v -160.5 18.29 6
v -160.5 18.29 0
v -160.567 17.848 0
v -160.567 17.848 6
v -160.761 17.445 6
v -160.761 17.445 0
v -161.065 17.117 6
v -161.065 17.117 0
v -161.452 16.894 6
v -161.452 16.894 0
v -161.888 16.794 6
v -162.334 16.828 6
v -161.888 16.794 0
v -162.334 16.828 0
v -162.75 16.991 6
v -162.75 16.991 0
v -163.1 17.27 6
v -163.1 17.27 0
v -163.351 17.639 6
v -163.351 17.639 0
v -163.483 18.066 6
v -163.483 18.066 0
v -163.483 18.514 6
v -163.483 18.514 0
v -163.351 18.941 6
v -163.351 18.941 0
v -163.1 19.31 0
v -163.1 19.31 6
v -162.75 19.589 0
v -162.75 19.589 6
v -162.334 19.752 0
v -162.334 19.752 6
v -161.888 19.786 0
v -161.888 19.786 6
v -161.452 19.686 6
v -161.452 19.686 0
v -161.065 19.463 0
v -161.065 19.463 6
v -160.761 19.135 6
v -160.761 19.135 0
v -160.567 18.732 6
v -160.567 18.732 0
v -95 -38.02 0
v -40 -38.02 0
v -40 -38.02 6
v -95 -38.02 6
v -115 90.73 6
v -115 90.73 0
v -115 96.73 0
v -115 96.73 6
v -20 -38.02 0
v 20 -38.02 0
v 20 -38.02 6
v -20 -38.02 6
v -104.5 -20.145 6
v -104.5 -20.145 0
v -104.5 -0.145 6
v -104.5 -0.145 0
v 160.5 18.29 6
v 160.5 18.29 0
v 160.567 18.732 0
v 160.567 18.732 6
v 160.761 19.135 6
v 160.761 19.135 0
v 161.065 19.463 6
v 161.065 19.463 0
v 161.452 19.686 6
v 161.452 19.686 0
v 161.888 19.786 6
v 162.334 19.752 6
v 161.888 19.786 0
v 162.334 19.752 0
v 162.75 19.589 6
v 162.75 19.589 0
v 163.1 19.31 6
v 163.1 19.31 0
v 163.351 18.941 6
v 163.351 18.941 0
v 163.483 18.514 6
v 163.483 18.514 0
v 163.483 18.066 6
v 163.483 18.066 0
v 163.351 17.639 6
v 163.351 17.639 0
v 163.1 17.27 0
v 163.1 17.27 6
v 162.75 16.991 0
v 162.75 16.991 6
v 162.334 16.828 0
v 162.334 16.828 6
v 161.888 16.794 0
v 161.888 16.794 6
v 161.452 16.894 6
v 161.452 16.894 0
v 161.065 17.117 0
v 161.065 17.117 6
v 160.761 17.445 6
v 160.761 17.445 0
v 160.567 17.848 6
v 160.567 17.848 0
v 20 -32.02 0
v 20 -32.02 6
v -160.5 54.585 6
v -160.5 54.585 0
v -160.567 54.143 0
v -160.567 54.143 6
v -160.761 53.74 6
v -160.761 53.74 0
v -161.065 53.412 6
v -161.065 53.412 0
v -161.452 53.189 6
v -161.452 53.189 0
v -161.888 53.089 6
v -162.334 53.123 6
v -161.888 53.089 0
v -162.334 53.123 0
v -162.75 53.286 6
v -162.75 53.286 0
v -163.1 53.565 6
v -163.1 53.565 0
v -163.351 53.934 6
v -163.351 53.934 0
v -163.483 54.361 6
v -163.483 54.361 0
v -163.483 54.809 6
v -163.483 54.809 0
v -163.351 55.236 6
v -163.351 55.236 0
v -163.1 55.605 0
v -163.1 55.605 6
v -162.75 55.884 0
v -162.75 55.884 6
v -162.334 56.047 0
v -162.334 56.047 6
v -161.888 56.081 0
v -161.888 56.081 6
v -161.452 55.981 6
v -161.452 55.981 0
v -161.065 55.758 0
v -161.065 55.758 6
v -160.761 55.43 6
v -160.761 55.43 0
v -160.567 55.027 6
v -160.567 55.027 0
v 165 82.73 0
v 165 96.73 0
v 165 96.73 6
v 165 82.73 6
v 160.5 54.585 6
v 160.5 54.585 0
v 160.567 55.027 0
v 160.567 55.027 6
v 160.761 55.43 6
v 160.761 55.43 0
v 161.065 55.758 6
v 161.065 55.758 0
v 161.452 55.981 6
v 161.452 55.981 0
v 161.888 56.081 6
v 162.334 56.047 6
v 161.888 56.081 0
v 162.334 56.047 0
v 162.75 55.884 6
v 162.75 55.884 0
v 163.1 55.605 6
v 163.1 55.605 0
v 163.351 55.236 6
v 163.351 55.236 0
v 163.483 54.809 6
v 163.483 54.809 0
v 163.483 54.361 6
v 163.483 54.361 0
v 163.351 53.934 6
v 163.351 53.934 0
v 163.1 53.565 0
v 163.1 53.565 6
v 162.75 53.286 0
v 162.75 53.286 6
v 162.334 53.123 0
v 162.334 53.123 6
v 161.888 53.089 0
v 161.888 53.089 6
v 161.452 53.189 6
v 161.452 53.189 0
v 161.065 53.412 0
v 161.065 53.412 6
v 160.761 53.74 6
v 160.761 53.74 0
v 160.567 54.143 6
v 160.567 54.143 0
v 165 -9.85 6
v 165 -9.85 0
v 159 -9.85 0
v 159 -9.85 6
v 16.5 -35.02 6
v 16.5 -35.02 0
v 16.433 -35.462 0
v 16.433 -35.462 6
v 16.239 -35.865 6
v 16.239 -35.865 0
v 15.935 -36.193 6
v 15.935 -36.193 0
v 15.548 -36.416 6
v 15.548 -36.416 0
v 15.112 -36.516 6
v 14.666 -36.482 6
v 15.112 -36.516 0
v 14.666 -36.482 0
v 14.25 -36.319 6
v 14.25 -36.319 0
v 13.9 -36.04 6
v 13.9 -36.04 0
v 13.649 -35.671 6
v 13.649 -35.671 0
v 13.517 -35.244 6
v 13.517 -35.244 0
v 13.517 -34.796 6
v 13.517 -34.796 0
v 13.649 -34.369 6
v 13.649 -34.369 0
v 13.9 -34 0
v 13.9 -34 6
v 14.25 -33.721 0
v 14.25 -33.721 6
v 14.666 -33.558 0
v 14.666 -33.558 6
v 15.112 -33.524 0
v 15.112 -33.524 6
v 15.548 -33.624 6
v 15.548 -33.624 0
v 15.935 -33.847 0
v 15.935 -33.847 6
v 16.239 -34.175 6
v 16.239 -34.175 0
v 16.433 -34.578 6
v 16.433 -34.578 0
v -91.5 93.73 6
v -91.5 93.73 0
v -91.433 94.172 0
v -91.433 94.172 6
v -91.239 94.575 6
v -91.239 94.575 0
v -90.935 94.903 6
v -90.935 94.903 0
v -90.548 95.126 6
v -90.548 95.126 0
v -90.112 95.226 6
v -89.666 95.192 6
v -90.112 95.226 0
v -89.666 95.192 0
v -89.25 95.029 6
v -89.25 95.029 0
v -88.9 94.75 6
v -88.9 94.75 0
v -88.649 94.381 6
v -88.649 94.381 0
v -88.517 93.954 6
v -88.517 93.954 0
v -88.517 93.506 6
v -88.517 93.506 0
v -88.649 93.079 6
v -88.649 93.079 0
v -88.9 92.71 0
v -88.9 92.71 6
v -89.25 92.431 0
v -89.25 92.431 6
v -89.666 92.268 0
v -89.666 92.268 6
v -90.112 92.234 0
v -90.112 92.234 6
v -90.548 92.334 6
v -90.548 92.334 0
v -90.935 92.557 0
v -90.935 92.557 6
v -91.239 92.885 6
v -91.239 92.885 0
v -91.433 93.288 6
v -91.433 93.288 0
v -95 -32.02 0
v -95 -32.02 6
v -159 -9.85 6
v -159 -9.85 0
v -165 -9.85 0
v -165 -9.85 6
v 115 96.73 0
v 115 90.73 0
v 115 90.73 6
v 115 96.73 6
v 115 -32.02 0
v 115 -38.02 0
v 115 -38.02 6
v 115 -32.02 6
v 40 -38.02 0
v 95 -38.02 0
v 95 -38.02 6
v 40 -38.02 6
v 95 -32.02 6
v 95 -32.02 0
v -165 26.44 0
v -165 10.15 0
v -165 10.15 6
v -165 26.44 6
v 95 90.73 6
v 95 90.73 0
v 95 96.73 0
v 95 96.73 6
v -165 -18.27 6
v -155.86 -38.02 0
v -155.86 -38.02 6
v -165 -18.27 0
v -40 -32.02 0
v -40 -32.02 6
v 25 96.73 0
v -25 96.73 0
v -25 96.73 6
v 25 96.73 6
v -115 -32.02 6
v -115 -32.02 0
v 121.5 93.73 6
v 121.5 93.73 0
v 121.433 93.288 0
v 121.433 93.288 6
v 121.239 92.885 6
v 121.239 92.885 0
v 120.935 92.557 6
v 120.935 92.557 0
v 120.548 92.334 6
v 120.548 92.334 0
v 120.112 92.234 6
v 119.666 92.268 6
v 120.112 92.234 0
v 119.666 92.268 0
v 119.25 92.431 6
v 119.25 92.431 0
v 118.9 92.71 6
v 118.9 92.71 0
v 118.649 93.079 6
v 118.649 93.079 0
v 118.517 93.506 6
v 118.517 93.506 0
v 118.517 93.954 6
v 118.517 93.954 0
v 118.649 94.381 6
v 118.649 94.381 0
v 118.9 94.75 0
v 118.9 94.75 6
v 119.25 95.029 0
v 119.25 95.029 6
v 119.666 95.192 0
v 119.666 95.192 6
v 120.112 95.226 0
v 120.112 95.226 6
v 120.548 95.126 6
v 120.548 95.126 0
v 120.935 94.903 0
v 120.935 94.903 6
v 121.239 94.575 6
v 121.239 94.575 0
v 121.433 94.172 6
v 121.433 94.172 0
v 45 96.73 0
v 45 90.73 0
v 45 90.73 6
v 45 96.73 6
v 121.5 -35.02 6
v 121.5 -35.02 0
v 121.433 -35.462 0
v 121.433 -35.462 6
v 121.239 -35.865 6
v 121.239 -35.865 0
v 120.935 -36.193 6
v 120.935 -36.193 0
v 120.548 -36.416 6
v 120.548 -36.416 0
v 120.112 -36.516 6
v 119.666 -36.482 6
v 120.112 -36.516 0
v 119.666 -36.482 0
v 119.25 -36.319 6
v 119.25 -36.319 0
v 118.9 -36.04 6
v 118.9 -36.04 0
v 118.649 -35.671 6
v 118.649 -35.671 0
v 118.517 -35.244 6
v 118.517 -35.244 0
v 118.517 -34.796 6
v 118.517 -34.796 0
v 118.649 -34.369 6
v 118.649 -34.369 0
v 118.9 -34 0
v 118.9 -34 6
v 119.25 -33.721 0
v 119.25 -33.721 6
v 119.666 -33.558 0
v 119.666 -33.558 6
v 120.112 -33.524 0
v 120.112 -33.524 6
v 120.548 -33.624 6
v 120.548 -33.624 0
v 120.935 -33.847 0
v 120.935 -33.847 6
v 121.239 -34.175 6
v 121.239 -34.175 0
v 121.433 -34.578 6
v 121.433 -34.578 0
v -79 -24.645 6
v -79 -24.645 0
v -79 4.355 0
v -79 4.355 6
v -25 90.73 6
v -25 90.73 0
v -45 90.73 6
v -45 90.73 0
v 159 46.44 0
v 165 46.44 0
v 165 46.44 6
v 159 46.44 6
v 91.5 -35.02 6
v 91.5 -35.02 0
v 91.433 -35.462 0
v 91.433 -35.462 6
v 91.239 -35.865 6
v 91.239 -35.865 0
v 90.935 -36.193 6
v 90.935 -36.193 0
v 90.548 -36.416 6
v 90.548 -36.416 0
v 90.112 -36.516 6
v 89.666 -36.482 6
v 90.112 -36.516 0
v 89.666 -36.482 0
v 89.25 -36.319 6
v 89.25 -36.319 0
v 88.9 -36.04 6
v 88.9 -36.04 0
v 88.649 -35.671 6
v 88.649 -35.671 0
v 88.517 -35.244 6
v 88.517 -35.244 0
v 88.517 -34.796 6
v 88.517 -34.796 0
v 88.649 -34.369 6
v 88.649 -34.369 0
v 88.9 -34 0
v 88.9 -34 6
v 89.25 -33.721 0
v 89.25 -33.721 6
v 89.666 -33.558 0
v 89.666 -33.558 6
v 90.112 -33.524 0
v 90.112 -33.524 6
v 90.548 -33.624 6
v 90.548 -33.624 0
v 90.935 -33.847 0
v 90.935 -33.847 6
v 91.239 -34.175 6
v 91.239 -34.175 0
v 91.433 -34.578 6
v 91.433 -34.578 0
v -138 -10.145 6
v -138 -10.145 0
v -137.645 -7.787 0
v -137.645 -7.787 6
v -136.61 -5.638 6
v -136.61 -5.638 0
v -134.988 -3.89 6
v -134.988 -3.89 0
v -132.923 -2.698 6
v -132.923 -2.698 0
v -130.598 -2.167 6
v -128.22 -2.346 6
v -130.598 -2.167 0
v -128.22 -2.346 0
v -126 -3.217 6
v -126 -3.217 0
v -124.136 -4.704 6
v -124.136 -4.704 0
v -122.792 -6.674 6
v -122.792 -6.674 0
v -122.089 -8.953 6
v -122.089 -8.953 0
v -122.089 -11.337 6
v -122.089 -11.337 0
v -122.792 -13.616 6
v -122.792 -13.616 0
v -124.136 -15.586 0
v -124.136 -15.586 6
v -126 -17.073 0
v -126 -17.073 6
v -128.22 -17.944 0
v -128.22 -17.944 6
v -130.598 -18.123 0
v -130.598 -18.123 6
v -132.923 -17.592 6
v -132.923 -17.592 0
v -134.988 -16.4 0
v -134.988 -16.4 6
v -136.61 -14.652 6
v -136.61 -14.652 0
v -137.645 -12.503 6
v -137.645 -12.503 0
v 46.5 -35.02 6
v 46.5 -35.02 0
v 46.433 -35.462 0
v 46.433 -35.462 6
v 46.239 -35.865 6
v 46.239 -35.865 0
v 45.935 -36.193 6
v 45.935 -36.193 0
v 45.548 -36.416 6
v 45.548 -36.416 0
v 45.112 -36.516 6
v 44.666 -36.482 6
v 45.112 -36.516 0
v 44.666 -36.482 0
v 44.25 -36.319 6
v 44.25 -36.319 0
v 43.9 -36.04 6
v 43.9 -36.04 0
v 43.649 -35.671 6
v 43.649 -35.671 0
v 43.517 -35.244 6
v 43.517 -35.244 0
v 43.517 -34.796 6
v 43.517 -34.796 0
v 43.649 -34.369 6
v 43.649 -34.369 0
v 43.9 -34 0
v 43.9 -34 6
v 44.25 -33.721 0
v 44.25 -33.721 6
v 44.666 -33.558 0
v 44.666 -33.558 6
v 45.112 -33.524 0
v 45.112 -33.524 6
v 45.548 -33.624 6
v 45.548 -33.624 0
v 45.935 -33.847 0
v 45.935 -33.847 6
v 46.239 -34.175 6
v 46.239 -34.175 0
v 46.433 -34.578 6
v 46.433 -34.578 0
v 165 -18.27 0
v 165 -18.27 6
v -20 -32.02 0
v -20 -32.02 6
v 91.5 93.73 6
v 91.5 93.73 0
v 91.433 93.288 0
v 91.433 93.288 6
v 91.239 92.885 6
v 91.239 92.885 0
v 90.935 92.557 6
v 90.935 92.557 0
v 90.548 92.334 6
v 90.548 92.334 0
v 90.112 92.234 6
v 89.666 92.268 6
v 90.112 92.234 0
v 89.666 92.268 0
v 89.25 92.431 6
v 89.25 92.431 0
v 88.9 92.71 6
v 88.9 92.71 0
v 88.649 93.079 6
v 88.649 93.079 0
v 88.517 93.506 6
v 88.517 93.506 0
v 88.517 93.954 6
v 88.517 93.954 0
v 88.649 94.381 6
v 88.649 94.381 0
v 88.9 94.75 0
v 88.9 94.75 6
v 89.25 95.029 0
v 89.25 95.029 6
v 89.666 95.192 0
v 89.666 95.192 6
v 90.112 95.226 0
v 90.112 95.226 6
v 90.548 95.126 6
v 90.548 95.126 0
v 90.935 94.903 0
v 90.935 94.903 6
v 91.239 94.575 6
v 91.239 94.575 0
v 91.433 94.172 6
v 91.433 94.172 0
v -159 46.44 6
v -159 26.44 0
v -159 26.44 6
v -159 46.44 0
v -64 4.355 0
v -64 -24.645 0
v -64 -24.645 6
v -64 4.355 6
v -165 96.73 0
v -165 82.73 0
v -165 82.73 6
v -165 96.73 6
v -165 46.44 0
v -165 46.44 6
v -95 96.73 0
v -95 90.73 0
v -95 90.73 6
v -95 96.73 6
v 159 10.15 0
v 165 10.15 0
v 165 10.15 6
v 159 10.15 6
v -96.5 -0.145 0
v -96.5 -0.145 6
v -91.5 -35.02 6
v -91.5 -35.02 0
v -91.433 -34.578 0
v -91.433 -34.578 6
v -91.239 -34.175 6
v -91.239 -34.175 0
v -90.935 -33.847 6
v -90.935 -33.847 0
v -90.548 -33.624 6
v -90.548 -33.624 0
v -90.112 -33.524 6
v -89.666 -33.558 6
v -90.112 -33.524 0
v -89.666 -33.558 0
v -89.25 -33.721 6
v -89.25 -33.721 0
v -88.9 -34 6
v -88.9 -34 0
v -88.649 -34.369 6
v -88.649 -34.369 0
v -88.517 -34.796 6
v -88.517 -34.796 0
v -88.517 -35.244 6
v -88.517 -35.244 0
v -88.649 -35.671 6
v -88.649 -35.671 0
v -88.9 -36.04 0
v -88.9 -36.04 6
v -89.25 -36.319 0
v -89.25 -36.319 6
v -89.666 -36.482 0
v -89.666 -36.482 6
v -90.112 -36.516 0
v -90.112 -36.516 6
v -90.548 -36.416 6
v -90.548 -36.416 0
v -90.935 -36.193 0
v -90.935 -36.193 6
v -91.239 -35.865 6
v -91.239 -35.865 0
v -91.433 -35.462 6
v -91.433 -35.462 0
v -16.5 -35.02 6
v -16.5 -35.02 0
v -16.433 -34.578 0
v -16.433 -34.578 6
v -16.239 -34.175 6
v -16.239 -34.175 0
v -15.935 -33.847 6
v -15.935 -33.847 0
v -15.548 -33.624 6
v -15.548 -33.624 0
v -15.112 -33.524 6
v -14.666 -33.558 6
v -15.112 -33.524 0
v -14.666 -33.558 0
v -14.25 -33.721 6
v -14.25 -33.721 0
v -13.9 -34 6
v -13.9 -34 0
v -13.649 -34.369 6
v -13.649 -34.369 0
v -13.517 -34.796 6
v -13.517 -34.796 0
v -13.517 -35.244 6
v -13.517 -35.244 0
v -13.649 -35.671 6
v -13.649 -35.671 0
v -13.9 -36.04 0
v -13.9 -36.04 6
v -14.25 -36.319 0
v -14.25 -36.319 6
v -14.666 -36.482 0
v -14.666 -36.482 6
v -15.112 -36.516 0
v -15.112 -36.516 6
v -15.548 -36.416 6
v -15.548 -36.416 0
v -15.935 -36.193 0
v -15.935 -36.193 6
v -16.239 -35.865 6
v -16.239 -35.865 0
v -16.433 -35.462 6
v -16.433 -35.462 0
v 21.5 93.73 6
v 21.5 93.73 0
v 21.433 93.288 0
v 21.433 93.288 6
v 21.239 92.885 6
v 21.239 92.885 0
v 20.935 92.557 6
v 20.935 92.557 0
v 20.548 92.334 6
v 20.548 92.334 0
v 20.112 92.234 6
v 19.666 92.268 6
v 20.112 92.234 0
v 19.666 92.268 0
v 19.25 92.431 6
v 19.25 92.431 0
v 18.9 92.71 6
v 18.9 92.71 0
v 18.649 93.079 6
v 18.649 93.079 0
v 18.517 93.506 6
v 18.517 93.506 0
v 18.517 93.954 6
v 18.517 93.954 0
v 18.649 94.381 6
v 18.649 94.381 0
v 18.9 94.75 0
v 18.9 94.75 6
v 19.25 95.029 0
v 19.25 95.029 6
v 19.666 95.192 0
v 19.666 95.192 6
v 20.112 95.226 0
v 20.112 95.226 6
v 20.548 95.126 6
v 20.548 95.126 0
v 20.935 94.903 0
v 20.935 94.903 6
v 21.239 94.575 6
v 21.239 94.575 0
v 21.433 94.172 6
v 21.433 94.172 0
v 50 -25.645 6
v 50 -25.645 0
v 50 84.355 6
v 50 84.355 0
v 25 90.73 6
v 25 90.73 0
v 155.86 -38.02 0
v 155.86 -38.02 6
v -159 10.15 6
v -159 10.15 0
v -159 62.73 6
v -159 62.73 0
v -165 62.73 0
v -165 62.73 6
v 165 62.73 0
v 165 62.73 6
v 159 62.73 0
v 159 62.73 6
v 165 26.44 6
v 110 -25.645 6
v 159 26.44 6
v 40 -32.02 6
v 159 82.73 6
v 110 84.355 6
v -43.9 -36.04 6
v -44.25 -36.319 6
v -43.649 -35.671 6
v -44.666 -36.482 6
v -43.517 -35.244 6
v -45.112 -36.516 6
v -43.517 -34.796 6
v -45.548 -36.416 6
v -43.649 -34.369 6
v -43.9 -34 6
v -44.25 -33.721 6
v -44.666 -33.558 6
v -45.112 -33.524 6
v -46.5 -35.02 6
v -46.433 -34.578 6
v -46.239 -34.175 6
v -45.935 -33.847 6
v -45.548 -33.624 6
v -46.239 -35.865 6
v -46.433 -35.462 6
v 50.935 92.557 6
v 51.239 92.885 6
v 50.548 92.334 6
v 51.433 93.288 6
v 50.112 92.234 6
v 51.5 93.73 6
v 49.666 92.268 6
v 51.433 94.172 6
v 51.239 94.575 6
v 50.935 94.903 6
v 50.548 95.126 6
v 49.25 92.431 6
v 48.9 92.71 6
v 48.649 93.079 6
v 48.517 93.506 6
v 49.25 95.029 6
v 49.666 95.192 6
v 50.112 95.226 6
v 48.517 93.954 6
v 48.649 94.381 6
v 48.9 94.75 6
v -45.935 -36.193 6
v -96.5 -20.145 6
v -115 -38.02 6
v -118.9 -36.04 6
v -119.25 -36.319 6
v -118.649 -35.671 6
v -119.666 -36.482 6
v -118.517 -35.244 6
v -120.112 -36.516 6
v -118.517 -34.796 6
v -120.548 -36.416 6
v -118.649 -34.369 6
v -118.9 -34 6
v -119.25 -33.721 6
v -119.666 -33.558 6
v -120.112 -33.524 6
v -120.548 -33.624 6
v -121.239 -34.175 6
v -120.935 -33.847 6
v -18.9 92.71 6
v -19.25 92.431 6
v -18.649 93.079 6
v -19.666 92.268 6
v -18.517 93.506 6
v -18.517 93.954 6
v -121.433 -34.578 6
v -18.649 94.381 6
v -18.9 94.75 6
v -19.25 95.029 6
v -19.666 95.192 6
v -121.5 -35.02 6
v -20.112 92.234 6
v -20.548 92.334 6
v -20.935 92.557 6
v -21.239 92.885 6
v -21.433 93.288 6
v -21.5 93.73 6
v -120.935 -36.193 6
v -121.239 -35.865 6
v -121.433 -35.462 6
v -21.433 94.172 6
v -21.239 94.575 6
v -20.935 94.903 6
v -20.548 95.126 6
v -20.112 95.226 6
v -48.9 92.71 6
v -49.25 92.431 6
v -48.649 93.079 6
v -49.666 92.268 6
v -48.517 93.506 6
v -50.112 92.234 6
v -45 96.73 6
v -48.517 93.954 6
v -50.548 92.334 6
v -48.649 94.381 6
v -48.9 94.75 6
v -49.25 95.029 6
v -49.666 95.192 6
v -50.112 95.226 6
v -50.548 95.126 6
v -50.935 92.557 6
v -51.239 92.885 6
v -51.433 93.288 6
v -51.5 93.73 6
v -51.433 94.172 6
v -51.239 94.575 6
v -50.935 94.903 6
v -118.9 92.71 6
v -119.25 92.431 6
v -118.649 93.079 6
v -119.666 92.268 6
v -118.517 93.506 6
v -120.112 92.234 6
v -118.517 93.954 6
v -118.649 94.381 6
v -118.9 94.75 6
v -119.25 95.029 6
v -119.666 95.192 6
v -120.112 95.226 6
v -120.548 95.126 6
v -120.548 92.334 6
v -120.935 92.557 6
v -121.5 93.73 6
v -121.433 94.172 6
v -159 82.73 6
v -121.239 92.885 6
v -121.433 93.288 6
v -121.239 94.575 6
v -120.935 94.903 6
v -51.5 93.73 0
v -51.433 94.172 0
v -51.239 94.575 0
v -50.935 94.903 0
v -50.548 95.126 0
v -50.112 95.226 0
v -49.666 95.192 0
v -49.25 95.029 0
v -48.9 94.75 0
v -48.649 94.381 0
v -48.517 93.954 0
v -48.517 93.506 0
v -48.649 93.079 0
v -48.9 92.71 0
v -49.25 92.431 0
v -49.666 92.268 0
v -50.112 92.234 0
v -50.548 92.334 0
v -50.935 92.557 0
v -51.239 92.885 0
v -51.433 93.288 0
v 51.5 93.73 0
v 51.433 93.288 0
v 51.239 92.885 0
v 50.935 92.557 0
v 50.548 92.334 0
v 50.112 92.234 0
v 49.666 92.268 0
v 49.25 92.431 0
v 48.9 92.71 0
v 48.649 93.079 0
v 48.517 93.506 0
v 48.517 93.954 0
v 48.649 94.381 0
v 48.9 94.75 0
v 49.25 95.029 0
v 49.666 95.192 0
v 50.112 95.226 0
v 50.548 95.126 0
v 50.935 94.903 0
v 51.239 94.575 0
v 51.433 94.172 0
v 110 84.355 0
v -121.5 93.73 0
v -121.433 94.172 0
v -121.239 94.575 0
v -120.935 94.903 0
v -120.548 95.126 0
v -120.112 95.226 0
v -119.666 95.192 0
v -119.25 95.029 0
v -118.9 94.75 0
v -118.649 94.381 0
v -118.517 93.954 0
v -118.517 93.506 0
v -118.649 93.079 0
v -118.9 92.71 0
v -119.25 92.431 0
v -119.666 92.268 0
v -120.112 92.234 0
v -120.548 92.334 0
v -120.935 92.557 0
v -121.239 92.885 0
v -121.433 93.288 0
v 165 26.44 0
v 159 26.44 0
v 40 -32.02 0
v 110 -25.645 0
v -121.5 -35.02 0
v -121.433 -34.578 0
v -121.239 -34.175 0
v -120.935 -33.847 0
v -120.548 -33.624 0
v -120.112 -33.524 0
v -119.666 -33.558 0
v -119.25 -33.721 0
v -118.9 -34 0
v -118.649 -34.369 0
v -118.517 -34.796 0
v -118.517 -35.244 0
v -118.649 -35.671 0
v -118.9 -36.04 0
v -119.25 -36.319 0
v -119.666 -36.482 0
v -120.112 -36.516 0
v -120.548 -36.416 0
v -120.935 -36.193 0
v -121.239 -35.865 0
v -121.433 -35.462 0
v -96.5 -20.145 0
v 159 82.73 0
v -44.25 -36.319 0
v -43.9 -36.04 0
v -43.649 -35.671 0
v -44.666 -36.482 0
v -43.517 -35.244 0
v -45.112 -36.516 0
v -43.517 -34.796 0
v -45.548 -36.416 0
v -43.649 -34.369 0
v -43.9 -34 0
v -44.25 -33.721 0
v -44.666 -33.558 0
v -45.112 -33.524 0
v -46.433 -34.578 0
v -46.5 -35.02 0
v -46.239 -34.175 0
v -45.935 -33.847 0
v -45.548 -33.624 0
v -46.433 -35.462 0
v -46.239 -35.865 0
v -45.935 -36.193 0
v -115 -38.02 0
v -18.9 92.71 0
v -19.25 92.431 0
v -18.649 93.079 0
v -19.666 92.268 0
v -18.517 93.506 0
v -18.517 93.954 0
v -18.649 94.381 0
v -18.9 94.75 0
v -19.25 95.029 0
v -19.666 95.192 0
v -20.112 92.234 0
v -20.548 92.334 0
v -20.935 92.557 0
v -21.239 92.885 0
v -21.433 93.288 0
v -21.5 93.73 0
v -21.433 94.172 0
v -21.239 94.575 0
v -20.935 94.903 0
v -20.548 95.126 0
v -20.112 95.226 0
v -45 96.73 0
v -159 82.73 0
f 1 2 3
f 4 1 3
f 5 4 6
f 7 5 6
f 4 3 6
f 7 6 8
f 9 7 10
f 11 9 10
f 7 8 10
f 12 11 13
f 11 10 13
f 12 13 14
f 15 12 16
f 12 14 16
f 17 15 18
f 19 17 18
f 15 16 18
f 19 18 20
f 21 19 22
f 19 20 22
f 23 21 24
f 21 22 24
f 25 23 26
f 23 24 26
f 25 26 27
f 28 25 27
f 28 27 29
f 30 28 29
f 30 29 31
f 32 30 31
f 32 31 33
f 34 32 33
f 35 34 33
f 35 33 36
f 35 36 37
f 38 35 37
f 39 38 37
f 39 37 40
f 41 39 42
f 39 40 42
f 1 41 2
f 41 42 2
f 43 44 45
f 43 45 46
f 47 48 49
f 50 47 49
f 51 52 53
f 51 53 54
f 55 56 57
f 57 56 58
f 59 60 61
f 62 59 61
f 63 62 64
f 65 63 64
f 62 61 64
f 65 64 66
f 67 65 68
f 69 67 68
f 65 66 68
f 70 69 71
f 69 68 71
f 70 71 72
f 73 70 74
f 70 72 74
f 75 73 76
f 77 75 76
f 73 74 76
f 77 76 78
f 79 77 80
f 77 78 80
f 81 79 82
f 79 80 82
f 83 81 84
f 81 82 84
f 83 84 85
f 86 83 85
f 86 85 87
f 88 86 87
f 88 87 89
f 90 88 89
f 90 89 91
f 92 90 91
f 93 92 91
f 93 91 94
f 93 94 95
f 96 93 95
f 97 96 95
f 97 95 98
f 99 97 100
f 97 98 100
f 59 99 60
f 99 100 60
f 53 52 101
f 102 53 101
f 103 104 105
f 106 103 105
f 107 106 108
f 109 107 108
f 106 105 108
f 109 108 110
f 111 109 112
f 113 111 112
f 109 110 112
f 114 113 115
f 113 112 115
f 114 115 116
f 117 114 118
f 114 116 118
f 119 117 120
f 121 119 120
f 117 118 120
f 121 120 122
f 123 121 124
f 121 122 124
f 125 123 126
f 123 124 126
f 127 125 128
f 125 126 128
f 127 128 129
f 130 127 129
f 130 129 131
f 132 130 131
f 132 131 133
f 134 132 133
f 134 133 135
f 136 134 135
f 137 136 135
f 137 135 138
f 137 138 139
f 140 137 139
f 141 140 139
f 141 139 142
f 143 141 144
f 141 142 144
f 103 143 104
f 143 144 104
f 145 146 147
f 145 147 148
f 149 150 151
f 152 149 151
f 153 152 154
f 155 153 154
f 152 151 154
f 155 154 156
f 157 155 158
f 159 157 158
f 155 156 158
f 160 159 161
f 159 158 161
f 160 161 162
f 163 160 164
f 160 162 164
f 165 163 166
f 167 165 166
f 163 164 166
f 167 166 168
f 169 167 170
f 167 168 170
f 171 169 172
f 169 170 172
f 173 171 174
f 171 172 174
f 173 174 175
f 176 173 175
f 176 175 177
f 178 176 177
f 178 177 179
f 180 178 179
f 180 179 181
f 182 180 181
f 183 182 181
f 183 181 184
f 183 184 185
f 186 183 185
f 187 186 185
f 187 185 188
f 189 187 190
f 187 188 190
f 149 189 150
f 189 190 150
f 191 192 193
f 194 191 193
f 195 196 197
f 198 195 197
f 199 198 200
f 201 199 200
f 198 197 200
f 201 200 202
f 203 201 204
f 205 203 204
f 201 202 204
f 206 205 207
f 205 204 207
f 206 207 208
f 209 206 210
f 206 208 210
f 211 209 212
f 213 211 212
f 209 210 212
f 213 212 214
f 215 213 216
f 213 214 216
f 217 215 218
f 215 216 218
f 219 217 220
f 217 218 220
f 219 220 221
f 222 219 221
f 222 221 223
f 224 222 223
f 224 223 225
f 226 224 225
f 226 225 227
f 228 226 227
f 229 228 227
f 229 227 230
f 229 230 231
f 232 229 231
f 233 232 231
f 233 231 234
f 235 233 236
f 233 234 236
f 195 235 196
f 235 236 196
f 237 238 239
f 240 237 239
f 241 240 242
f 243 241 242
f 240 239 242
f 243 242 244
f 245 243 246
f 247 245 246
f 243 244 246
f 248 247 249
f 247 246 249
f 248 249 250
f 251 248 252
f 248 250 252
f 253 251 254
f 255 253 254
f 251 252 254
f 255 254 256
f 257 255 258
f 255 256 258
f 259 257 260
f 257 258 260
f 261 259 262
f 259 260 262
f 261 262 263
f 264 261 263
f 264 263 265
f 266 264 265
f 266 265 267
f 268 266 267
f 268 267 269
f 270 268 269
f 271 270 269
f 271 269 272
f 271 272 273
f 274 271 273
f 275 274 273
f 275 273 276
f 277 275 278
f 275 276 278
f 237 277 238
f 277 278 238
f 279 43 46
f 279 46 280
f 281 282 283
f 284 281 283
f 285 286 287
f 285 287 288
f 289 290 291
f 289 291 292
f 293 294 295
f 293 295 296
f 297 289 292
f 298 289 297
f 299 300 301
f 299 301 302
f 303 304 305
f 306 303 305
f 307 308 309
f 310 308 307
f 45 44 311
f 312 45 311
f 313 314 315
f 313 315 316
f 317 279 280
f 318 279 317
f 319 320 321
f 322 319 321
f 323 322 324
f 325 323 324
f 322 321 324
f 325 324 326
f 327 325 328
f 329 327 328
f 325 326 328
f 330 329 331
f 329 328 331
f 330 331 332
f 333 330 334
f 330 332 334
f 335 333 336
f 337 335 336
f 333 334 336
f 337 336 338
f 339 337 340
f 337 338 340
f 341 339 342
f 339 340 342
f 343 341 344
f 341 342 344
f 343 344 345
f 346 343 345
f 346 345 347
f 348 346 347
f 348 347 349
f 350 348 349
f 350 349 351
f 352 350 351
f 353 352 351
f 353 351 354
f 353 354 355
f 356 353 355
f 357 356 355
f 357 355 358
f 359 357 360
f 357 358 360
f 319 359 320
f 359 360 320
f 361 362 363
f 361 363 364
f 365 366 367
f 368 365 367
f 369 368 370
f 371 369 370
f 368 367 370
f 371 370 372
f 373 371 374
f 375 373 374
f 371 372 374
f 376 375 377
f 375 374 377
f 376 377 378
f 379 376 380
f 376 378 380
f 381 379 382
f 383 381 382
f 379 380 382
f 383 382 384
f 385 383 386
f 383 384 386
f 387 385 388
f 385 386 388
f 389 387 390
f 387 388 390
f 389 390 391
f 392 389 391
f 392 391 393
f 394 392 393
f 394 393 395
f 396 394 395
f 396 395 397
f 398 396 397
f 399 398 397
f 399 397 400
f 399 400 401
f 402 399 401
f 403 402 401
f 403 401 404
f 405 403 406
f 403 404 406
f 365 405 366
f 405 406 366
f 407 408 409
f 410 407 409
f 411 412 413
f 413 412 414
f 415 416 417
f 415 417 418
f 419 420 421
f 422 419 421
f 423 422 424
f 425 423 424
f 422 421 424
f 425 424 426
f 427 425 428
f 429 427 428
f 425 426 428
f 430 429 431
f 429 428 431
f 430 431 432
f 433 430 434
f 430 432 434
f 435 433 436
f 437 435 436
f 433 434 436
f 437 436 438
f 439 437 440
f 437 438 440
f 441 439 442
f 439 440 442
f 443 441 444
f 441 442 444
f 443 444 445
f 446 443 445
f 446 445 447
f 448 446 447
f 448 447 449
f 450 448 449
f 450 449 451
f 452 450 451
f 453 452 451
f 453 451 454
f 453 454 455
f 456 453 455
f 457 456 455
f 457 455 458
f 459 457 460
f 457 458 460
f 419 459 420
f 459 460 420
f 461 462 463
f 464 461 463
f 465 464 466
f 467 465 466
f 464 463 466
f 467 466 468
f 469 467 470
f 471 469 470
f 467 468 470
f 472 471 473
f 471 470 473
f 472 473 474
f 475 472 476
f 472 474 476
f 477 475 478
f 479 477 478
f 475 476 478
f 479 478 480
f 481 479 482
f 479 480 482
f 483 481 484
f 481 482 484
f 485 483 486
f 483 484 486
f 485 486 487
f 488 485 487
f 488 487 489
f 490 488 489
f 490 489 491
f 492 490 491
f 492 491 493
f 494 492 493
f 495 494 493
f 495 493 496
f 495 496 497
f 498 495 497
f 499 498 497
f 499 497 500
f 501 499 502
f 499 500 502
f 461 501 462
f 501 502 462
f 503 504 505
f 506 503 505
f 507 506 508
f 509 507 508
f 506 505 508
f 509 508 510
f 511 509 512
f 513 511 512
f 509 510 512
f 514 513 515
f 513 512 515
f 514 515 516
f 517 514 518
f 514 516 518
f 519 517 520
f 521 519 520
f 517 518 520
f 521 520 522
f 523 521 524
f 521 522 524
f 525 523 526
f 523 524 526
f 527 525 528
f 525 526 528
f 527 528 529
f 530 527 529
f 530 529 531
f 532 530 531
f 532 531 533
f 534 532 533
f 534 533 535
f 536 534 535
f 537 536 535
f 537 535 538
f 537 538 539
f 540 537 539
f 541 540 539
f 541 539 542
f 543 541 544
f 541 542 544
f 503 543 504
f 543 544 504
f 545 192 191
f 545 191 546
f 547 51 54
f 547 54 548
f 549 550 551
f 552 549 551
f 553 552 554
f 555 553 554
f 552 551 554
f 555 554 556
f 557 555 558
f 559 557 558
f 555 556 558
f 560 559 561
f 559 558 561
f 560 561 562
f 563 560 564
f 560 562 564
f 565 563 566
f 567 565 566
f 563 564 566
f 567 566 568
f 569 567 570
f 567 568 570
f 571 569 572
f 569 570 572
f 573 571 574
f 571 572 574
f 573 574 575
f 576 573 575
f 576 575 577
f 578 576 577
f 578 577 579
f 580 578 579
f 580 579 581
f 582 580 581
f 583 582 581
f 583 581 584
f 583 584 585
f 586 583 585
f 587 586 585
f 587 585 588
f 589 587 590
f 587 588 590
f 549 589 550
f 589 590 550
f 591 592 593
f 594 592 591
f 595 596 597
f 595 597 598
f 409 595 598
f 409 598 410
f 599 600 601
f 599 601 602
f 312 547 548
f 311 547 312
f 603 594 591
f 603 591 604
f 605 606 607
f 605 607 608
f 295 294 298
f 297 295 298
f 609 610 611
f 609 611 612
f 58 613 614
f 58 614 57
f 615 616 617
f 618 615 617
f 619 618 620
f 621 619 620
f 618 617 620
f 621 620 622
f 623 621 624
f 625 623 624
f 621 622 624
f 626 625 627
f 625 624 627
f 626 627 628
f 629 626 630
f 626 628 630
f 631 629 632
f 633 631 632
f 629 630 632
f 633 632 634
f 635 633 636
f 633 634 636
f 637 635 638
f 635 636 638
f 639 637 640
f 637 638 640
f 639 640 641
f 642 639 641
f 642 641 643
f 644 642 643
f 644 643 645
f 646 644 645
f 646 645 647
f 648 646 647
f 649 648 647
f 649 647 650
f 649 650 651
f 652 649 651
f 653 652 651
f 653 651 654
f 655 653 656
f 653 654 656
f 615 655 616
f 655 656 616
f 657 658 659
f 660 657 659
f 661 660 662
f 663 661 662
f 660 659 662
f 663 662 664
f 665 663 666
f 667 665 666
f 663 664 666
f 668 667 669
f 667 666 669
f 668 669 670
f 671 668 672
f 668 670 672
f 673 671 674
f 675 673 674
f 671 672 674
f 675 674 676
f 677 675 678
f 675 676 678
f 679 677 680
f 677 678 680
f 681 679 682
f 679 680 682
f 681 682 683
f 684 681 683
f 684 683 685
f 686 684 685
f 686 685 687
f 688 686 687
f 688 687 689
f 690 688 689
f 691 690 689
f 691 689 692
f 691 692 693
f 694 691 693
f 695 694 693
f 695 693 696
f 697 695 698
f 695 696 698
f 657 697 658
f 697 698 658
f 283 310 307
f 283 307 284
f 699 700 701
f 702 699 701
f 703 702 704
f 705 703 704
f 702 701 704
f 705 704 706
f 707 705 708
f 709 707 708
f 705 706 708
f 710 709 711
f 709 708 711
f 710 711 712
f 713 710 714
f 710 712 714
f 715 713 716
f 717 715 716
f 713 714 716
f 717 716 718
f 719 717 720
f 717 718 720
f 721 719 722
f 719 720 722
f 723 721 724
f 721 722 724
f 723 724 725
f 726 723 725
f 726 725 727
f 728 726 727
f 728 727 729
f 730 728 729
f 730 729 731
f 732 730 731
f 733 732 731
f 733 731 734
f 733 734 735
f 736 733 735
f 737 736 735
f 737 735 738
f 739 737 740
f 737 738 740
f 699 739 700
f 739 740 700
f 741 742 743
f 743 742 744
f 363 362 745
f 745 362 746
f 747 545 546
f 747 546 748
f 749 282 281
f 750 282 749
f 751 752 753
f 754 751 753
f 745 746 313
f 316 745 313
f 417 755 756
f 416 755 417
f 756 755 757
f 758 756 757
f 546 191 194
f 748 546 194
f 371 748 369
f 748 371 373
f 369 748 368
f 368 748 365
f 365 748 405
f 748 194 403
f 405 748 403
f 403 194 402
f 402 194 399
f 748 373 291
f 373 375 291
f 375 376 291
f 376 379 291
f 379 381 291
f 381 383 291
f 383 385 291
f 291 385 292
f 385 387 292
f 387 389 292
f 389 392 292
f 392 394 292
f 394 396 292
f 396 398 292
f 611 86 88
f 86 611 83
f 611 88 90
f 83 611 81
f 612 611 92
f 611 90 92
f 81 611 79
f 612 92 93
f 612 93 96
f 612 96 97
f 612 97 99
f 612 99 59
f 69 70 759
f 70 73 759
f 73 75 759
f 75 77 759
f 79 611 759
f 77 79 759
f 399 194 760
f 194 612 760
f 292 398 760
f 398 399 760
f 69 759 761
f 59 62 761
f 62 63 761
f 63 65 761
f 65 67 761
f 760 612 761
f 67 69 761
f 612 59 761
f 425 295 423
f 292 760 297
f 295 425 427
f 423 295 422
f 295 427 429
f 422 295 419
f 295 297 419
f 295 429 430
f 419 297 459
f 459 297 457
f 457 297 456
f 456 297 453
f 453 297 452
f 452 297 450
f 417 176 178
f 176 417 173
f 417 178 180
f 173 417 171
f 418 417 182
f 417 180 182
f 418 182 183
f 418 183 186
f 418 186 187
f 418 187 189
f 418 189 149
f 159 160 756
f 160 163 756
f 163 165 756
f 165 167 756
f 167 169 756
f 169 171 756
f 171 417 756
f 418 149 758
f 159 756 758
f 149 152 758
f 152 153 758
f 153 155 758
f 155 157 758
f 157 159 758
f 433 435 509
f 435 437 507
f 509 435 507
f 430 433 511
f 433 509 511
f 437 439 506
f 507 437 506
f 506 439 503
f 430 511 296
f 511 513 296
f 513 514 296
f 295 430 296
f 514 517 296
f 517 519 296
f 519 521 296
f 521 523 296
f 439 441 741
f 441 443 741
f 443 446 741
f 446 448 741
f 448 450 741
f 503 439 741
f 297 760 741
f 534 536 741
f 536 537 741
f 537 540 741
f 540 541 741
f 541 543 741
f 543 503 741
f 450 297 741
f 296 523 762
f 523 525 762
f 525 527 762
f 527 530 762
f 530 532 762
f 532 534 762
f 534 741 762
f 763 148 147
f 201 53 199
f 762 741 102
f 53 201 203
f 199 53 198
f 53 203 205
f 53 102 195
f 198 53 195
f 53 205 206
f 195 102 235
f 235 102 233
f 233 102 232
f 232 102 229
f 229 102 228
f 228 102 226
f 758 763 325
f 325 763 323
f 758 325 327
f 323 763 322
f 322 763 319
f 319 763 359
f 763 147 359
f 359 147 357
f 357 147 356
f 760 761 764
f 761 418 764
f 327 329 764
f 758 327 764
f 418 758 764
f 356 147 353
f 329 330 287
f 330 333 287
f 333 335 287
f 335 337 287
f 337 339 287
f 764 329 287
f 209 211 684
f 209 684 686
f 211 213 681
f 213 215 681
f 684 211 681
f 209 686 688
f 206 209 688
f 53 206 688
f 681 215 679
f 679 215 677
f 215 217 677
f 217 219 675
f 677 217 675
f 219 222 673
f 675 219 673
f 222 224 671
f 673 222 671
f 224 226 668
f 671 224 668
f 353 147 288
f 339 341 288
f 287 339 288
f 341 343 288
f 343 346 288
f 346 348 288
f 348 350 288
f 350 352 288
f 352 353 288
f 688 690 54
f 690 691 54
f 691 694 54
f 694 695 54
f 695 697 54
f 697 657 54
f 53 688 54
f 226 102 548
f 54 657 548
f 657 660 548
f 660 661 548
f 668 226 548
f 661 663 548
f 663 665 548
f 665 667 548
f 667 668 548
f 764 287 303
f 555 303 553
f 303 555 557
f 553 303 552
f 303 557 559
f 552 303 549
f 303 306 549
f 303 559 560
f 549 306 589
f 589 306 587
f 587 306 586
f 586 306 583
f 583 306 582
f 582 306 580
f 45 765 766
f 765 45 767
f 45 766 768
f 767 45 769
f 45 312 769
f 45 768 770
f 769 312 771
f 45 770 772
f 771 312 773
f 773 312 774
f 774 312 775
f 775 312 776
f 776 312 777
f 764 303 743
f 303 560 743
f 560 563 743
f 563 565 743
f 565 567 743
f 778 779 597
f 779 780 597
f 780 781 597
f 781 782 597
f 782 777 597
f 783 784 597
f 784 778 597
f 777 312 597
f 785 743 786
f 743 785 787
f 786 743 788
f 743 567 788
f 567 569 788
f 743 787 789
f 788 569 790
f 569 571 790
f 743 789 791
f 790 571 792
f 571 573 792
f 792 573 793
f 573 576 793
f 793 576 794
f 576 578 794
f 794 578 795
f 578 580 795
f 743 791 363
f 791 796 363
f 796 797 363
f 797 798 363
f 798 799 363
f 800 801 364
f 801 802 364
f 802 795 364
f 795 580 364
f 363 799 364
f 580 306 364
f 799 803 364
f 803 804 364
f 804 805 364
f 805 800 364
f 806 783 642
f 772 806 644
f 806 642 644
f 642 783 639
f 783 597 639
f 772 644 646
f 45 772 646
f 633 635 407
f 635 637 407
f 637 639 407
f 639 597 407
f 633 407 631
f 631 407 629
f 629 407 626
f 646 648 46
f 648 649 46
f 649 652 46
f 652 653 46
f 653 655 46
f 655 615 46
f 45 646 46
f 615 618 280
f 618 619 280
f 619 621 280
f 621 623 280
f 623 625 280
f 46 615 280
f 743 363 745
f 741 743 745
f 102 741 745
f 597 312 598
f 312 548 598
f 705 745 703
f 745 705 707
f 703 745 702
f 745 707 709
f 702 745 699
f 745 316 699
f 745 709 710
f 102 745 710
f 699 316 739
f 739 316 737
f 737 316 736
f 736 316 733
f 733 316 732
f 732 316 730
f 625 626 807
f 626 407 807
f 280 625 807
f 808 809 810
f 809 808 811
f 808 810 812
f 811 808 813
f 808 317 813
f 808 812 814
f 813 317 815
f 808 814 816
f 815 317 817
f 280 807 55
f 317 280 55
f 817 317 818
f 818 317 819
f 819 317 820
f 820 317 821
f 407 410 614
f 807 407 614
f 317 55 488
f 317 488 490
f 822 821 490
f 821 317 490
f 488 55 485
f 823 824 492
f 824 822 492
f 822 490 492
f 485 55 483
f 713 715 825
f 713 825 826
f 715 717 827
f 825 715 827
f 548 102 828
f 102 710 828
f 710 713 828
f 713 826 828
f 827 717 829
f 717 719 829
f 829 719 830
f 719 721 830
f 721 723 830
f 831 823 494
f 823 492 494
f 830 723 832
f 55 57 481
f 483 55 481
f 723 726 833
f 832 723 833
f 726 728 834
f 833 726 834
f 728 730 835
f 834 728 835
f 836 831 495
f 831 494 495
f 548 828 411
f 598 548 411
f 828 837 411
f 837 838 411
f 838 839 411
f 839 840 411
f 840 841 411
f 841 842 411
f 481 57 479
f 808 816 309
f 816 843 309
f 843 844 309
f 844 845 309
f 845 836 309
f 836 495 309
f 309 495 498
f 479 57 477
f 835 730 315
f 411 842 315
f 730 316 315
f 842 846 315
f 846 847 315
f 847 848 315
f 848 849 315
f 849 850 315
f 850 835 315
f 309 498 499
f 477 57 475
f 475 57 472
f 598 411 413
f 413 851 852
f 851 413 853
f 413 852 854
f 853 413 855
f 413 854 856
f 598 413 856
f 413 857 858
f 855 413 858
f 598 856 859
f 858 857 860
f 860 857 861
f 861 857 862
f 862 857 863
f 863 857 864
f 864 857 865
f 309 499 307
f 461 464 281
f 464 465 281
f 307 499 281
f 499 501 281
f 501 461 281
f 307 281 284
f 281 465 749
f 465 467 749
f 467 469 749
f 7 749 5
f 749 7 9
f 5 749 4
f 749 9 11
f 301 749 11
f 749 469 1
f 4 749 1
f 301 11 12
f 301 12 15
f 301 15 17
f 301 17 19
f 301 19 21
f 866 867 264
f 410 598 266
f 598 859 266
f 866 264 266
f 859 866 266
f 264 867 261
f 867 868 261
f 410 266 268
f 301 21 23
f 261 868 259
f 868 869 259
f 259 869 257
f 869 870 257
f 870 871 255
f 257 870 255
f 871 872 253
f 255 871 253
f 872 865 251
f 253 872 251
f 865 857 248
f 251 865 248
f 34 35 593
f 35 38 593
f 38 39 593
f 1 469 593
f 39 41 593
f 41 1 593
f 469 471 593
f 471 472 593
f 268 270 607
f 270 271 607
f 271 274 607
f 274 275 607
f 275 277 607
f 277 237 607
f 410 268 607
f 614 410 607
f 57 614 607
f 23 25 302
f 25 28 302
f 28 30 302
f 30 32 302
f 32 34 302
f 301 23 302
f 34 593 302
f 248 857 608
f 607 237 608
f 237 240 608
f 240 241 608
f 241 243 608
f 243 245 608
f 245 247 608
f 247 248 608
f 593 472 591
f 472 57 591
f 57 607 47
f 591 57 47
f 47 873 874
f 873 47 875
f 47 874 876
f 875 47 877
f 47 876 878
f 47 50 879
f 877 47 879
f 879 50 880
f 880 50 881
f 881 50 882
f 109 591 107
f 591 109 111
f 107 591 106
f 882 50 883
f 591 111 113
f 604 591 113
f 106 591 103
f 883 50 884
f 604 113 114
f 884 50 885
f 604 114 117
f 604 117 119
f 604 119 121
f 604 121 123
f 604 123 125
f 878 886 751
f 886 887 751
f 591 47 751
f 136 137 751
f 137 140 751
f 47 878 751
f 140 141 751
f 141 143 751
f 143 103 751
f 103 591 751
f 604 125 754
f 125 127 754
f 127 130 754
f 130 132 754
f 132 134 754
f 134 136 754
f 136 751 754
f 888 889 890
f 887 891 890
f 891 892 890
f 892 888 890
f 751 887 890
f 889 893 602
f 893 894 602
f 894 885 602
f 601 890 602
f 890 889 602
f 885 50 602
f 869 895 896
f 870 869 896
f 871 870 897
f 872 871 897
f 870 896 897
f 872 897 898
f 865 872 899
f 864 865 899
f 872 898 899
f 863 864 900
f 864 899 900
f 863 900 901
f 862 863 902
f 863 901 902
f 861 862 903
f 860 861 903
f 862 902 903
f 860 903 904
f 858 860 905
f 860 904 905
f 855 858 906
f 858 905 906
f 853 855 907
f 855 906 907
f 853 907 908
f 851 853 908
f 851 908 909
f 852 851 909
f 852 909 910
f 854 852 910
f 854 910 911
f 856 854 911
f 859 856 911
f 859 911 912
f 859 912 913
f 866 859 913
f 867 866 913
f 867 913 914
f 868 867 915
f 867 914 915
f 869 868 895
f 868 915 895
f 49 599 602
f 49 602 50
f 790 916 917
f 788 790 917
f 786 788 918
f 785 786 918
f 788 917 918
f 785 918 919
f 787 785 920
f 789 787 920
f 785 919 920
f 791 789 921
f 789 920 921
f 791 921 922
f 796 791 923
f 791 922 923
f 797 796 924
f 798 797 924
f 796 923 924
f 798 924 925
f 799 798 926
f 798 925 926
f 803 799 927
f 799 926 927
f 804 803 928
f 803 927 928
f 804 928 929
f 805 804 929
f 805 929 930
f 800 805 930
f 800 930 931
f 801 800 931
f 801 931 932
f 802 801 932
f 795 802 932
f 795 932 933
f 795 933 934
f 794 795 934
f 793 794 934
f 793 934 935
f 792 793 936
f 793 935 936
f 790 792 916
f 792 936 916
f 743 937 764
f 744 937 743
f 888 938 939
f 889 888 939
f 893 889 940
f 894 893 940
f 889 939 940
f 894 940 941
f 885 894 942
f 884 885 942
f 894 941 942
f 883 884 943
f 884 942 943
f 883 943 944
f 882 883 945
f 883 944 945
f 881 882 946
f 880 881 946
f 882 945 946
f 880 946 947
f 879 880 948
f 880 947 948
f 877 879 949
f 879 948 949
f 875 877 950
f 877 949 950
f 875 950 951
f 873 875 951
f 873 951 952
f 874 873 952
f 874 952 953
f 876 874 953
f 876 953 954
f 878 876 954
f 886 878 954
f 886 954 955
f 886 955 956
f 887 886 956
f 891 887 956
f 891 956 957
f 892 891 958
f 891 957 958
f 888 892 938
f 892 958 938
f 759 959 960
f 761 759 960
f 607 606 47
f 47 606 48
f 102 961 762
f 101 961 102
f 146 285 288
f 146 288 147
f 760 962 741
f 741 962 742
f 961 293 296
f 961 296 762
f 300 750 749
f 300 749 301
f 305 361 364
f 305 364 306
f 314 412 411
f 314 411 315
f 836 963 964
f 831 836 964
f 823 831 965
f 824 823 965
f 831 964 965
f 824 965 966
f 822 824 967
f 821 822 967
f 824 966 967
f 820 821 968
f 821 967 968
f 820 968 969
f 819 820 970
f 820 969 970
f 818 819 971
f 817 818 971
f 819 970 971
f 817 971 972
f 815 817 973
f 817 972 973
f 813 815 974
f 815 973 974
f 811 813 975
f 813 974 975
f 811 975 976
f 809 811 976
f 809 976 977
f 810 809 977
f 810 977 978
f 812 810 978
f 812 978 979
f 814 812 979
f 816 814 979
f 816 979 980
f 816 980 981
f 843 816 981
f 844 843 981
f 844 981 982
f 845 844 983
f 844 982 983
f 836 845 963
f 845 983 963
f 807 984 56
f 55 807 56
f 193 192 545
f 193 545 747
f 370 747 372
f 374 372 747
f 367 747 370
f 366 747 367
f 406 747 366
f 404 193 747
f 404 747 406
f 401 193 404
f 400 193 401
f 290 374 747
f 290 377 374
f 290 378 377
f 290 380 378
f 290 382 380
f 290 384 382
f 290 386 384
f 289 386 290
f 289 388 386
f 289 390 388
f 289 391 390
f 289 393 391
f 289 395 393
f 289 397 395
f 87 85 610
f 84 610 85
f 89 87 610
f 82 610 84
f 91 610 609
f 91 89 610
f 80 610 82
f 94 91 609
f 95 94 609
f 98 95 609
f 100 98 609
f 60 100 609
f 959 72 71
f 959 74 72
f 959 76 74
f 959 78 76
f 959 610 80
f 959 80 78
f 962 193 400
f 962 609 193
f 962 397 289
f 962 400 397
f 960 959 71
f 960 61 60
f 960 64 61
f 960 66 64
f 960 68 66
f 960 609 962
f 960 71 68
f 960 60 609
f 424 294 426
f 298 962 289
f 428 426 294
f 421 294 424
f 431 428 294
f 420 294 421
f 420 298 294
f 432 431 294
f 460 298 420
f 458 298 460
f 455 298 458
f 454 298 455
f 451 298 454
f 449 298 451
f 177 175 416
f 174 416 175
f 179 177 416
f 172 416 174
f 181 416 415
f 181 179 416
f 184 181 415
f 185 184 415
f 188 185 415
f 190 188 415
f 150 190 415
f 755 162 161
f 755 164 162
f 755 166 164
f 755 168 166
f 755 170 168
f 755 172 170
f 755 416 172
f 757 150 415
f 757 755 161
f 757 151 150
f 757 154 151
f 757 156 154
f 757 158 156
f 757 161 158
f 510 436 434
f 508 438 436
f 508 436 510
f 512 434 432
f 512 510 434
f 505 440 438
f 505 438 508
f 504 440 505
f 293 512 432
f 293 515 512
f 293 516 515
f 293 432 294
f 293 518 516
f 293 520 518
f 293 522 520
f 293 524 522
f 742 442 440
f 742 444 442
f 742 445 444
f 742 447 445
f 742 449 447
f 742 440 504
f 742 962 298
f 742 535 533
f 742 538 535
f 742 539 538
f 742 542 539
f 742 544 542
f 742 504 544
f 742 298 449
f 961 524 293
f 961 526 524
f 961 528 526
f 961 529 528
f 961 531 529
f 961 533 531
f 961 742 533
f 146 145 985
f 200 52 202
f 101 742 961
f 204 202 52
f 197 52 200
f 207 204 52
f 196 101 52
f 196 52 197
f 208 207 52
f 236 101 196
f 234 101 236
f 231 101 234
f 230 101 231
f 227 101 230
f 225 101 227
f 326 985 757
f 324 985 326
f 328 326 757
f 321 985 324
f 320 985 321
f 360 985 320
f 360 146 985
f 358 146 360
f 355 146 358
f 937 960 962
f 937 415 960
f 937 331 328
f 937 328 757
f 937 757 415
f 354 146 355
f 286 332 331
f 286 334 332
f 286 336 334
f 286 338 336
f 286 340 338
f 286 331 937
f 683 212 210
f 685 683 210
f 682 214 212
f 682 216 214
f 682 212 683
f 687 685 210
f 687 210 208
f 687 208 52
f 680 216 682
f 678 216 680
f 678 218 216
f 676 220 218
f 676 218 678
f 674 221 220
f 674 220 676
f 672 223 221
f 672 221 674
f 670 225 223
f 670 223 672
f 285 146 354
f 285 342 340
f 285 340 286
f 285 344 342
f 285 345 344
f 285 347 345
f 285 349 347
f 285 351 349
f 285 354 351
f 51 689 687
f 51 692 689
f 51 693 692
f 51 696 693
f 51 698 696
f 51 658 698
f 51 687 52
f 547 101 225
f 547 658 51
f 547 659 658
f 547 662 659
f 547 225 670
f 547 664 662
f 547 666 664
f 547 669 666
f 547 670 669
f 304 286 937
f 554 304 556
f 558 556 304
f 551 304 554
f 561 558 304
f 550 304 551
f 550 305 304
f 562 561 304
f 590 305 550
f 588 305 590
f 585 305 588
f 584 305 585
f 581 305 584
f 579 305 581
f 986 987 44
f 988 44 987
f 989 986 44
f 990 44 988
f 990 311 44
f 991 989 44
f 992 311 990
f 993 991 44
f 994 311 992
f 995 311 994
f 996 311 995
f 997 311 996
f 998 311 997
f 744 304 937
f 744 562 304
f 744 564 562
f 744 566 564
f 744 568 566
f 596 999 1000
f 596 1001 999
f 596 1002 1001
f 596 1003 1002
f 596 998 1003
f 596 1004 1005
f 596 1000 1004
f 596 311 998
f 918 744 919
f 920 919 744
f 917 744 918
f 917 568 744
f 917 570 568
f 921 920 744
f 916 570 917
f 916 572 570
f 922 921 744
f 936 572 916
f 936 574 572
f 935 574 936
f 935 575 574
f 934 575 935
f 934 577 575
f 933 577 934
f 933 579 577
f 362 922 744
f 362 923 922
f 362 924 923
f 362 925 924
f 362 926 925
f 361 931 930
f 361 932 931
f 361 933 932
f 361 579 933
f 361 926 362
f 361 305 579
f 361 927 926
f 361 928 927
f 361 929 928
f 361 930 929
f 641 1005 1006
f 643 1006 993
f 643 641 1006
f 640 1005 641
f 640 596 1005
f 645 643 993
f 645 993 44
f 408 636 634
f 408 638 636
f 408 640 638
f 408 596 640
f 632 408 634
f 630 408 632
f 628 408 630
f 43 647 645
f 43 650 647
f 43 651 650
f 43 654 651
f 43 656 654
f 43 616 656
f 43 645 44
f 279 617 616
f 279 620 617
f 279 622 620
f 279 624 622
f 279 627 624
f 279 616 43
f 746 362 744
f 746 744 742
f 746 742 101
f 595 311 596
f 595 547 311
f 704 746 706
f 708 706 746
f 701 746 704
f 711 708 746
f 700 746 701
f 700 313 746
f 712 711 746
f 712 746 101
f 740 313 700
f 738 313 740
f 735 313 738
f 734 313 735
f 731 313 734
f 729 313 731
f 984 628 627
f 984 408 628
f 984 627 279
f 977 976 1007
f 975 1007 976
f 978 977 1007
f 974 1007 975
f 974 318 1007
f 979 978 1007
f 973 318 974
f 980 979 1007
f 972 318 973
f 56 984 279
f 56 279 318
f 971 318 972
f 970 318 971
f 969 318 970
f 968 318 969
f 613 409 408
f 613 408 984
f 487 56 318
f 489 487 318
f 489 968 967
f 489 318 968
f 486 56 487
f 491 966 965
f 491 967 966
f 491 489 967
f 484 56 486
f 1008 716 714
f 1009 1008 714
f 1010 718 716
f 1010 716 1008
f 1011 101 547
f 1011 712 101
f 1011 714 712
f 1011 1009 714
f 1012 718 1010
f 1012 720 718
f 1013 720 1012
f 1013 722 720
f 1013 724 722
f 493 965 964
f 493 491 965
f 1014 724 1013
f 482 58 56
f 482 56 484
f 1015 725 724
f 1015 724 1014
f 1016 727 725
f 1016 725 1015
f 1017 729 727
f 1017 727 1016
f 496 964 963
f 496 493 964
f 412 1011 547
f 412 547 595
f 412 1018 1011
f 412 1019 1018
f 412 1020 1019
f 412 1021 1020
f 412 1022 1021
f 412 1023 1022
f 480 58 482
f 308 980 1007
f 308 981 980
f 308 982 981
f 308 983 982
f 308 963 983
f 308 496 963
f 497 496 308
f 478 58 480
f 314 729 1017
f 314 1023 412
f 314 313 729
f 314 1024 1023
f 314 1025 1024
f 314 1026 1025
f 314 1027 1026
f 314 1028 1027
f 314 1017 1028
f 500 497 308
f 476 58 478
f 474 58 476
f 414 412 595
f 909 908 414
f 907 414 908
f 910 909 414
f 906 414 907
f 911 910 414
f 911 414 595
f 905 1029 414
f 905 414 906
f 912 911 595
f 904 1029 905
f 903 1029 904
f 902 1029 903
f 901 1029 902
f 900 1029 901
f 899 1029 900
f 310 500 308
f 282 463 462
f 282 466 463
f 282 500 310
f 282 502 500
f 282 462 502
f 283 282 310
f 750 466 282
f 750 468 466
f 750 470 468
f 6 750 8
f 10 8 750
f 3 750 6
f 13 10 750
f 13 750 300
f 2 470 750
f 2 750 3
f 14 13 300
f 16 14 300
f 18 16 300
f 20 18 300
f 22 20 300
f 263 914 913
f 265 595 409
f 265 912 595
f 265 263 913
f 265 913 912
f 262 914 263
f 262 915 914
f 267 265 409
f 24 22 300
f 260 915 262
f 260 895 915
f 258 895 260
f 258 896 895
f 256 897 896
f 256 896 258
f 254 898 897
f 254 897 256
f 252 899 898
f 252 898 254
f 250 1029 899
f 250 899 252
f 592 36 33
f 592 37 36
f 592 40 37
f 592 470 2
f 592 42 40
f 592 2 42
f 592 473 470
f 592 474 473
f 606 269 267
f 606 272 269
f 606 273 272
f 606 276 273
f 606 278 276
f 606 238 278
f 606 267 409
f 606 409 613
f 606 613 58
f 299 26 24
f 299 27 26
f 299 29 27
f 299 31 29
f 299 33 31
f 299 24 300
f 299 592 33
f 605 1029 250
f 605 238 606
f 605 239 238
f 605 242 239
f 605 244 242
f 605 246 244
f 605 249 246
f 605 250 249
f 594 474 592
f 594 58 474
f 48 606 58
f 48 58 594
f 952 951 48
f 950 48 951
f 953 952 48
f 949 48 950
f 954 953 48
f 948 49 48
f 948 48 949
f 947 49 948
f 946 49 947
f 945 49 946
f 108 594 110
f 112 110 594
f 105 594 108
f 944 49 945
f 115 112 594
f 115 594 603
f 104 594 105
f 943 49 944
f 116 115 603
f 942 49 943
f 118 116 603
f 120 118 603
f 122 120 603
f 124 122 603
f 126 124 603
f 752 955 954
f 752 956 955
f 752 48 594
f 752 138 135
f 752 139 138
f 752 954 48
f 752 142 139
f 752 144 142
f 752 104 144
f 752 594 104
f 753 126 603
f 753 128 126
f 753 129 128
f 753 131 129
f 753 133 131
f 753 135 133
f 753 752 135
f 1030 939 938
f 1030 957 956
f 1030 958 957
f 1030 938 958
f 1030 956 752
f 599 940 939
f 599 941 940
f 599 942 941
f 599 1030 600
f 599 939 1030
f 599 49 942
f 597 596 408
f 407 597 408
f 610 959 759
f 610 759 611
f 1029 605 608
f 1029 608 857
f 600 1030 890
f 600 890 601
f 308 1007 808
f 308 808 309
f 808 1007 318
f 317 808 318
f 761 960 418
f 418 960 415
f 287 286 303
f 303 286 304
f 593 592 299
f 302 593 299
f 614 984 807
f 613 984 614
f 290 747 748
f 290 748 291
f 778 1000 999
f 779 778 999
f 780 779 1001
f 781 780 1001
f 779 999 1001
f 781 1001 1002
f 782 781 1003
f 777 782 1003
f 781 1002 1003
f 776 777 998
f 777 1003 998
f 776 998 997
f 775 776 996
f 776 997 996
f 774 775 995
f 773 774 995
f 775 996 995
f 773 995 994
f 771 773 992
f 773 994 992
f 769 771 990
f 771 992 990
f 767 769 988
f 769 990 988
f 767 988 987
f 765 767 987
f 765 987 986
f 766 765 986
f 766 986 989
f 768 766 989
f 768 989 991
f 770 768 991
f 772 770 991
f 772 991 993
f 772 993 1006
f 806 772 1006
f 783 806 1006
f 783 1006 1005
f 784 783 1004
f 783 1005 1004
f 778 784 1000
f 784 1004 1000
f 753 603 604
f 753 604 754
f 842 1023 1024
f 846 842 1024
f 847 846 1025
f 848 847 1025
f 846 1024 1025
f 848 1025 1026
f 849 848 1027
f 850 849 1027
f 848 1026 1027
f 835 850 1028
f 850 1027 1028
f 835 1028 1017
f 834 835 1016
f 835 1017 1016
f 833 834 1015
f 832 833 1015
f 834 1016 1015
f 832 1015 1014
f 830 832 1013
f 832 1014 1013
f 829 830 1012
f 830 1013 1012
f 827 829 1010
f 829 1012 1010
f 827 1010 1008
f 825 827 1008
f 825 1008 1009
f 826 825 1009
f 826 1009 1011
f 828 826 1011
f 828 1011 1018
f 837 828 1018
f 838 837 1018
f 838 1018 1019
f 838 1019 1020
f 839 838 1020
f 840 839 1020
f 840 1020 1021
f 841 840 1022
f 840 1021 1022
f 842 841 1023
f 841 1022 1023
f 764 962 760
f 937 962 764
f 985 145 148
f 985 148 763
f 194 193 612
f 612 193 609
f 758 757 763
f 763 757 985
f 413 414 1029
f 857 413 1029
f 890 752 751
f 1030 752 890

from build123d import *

# Parameters (mm, degrees)
BOSS_EXTRU_1_DEPTH      = 6
ESQUISSE3_R             = 8
ESQUISSE3_W             = 6
ESQUISSE3_H             = 20
ESQUISSE3_W_2           = 20
ESQUISSE3_H_2           = 6
ESQUISSE3_W_3           = 60
ESQUISSE3_H_3           = 110
ESQUISSE3_W_4           = 8
ESQUISSE3_W_5           = 15
ESQUISSE3_H_4           = 29
ENL_V_MAT_EXTRU_2_DEPTH = 6
ESQUISSE4_R             = 1.5
ENL_V_MAT_EXTRU_3_DEPTH = 6
ESQUISSE5_W             = 456.045253014
ESQUISSE5_H             = 136.228984631
ENL_V_MAT_EXTRU_4_DEPTH = 6


with BuildPart() as part:
    # Esquisse1 → Boss.-Extru.1 (new body)
    with BuildSketch(Plane.XY):
        Polygon((-165, 96.73), (165, 96.73), (165, -18.27), (123, -109.022410436), (-123, -109.022410436), (-165, -18.27), align=None)
    extrude(amount=BOSS_EXTRU_1_DEPTH)

    # Esquisse3 → Enlèv. mat.-Extru.2 (cut)
    with BuildSketch(Plane(origin=(0, 0, 0), x_dir=(-1, 0, 0), z_dir=(0, 0, -1))):
        with Locations((130, -10.145)):
            Circle(ESQUISSE3_R)
        with Locations((162, 36.44)):
            Rectangle(ESQUISSE3_W, ESQUISSE3_H)
        with Locations((162, 72.73)):
            Rectangle(ESQUISSE3_W, ESQUISSE3_H)
        with Locations((162, 0.15)):
            Rectangle(ESQUISSE3_W, ESQUISSE3_H)
        with Locations((-30, -35.02)):
            Rectangle(ESQUISSE3_W_2, ESQUISSE3_H_2)
        with Locations((105, -35.02)):
            Rectangle(ESQUISSE3_W_2, ESQUISSE3_H_2)
        with Locations((-80, 29.355)):
            Rectangle(ESQUISSE3_W_3, ESQUISSE3_H_3)
        with Locations((-162, 72.73)):
            Rectangle(ESQUISSE3_W, ESQUISSE3_H)
        with Locations((30, -35.02)):
            Rectangle(ESQUISSE3_W_2, ESQUISSE3_H_2)
        with Locations((-162, 36.44)):
            Rectangle(ESQUISSE3_W, ESQUISSE3_H)
        with Locations((-162, 0.15)):
            Rectangle(ESQUISSE3_W, ESQUISSE3_H)
        with Locations((105, 93.73)):
            Rectangle(ESQUISSE3_W_2, ESQUISSE3_H_2)
        with Locations((-35, 93.73)):
            Rectangle(ESQUISSE3_W_2, ESQUISSE3_H_2)
        with Locations((35, 93.73)):
            Rectangle(ESQUISSE3_W_2, ESQUISSE3_H_2)
        with Locations((-105, 93.73)):
            Rectangle(ESQUISSE3_W_2, ESQUISSE3_H_2)
        with Locations((100.5, -10.145)):
            Rectangle(ESQUISSE3_W_4, ESQUISSE3_H)
        with Locations((-105, -35.02)):
            Rectangle(ESQUISSE3_W_2, ESQUISSE3_H_2)
        with Locations((71.5, -10.145)):
            Rectangle(ESQUISSE3_W_5, ESQUISSE3_H_4)
    extrude(amount=-ENL_V_MAT_EXTRU_2_DEPTH, mode=Mode.SUBTRACT)

    # Esquisse4 → Enlèv. mat.-Extru.3 (cut)
    with BuildSketch(Plane(origin=(0, 0, 0), x_dir=(-1, 0, 0), z_dir=(0, 0, -1))):
        with Locations(Location((162, 18.29, 0), (0, 0, 180))):
            Circle(ESQUISSE4_R)
        with Locations((120, -35.02)):
            Circle(ESQUISSE4_R)
        with Locations(Location((162, 54.585, 0), (0, 0, 180))):
            Circle(ESQUISSE4_R)
        with Locations((90, -35.02)):
            Circle(ESQUISSE4_R)
        with Locations((45, -35.02)):
            Circle(ESQUISSE4_R)
        with Locations((15, -35.02)):
            Circle(ESQUISSE4_R)
        with Locations(Location((-15, -35.02, 0), (0, 0, 180))):
            Circle(ESQUISSE4_R)
        with Locations(Location((-45, -35.02, 0), (0, 0, 180))):
            Circle(ESQUISSE4_R)
        with Locations(Location((-90, -35.02, 0), (0, 0, 180))):
            Circle(ESQUISSE4_R)
        with Locations((120, 93.73)):
            Circle(ESQUISSE4_R)
        with Locations(Location((-120, -35.02, 0), (0, 0, 180))):
            Circle(ESQUISSE4_R)
        with Locations((90, 93.73)):
            Circle(ESQUISSE4_R)
        with Locations((50, 93.73)):
            Circle(ESQUISSE4_R)
        with Locations((20, 93.73)):
            Circle(ESQUISSE4_R)
        with Locations((-162, 18.29)):
            Circle(ESQUISSE4_R)
        with Locations((-162, 54.585)):
            Circle(ESQUISSE4_R)
        with Locations(Location((-20, 93.73, 0), (0, 0, 180))):
            Circle(ESQUISSE4_R)
        with Locations(Location((-50, 93.73, 0), (0, 0, 180))):
            Circle(ESQUISSE4_R)
        with Locations(Location((-90, 93.73, 0), (0, 0, 180))):
            Circle(ESQUISSE4_R)
        with Locations(Location((-120, 93.73, 0), (0, 0, 180))):
            Circle(ESQUISSE4_R)
    extrude(amount=-ENL_V_MAT_EXTRU_3_DEPTH, mode=Mode.SUBTRACT)

    # Esquisse5 → Enlèv. mat.-Extru.4 (cut)
    with BuildSketch(Plane(origin=(0, 0, 0), x_dir=(-1, 0, 0), z_dir=(0, 0, -1))):
        with Locations((-18.307092018, -106.134492316)):
            Rectangle(ESQUISSE5_W, ESQUISSE5_H)
    extrude(amount=-ENL_V_MAT_EXTRU_4_DEPTH, mode=Mode.SUBTRACT)


solid = part.part
